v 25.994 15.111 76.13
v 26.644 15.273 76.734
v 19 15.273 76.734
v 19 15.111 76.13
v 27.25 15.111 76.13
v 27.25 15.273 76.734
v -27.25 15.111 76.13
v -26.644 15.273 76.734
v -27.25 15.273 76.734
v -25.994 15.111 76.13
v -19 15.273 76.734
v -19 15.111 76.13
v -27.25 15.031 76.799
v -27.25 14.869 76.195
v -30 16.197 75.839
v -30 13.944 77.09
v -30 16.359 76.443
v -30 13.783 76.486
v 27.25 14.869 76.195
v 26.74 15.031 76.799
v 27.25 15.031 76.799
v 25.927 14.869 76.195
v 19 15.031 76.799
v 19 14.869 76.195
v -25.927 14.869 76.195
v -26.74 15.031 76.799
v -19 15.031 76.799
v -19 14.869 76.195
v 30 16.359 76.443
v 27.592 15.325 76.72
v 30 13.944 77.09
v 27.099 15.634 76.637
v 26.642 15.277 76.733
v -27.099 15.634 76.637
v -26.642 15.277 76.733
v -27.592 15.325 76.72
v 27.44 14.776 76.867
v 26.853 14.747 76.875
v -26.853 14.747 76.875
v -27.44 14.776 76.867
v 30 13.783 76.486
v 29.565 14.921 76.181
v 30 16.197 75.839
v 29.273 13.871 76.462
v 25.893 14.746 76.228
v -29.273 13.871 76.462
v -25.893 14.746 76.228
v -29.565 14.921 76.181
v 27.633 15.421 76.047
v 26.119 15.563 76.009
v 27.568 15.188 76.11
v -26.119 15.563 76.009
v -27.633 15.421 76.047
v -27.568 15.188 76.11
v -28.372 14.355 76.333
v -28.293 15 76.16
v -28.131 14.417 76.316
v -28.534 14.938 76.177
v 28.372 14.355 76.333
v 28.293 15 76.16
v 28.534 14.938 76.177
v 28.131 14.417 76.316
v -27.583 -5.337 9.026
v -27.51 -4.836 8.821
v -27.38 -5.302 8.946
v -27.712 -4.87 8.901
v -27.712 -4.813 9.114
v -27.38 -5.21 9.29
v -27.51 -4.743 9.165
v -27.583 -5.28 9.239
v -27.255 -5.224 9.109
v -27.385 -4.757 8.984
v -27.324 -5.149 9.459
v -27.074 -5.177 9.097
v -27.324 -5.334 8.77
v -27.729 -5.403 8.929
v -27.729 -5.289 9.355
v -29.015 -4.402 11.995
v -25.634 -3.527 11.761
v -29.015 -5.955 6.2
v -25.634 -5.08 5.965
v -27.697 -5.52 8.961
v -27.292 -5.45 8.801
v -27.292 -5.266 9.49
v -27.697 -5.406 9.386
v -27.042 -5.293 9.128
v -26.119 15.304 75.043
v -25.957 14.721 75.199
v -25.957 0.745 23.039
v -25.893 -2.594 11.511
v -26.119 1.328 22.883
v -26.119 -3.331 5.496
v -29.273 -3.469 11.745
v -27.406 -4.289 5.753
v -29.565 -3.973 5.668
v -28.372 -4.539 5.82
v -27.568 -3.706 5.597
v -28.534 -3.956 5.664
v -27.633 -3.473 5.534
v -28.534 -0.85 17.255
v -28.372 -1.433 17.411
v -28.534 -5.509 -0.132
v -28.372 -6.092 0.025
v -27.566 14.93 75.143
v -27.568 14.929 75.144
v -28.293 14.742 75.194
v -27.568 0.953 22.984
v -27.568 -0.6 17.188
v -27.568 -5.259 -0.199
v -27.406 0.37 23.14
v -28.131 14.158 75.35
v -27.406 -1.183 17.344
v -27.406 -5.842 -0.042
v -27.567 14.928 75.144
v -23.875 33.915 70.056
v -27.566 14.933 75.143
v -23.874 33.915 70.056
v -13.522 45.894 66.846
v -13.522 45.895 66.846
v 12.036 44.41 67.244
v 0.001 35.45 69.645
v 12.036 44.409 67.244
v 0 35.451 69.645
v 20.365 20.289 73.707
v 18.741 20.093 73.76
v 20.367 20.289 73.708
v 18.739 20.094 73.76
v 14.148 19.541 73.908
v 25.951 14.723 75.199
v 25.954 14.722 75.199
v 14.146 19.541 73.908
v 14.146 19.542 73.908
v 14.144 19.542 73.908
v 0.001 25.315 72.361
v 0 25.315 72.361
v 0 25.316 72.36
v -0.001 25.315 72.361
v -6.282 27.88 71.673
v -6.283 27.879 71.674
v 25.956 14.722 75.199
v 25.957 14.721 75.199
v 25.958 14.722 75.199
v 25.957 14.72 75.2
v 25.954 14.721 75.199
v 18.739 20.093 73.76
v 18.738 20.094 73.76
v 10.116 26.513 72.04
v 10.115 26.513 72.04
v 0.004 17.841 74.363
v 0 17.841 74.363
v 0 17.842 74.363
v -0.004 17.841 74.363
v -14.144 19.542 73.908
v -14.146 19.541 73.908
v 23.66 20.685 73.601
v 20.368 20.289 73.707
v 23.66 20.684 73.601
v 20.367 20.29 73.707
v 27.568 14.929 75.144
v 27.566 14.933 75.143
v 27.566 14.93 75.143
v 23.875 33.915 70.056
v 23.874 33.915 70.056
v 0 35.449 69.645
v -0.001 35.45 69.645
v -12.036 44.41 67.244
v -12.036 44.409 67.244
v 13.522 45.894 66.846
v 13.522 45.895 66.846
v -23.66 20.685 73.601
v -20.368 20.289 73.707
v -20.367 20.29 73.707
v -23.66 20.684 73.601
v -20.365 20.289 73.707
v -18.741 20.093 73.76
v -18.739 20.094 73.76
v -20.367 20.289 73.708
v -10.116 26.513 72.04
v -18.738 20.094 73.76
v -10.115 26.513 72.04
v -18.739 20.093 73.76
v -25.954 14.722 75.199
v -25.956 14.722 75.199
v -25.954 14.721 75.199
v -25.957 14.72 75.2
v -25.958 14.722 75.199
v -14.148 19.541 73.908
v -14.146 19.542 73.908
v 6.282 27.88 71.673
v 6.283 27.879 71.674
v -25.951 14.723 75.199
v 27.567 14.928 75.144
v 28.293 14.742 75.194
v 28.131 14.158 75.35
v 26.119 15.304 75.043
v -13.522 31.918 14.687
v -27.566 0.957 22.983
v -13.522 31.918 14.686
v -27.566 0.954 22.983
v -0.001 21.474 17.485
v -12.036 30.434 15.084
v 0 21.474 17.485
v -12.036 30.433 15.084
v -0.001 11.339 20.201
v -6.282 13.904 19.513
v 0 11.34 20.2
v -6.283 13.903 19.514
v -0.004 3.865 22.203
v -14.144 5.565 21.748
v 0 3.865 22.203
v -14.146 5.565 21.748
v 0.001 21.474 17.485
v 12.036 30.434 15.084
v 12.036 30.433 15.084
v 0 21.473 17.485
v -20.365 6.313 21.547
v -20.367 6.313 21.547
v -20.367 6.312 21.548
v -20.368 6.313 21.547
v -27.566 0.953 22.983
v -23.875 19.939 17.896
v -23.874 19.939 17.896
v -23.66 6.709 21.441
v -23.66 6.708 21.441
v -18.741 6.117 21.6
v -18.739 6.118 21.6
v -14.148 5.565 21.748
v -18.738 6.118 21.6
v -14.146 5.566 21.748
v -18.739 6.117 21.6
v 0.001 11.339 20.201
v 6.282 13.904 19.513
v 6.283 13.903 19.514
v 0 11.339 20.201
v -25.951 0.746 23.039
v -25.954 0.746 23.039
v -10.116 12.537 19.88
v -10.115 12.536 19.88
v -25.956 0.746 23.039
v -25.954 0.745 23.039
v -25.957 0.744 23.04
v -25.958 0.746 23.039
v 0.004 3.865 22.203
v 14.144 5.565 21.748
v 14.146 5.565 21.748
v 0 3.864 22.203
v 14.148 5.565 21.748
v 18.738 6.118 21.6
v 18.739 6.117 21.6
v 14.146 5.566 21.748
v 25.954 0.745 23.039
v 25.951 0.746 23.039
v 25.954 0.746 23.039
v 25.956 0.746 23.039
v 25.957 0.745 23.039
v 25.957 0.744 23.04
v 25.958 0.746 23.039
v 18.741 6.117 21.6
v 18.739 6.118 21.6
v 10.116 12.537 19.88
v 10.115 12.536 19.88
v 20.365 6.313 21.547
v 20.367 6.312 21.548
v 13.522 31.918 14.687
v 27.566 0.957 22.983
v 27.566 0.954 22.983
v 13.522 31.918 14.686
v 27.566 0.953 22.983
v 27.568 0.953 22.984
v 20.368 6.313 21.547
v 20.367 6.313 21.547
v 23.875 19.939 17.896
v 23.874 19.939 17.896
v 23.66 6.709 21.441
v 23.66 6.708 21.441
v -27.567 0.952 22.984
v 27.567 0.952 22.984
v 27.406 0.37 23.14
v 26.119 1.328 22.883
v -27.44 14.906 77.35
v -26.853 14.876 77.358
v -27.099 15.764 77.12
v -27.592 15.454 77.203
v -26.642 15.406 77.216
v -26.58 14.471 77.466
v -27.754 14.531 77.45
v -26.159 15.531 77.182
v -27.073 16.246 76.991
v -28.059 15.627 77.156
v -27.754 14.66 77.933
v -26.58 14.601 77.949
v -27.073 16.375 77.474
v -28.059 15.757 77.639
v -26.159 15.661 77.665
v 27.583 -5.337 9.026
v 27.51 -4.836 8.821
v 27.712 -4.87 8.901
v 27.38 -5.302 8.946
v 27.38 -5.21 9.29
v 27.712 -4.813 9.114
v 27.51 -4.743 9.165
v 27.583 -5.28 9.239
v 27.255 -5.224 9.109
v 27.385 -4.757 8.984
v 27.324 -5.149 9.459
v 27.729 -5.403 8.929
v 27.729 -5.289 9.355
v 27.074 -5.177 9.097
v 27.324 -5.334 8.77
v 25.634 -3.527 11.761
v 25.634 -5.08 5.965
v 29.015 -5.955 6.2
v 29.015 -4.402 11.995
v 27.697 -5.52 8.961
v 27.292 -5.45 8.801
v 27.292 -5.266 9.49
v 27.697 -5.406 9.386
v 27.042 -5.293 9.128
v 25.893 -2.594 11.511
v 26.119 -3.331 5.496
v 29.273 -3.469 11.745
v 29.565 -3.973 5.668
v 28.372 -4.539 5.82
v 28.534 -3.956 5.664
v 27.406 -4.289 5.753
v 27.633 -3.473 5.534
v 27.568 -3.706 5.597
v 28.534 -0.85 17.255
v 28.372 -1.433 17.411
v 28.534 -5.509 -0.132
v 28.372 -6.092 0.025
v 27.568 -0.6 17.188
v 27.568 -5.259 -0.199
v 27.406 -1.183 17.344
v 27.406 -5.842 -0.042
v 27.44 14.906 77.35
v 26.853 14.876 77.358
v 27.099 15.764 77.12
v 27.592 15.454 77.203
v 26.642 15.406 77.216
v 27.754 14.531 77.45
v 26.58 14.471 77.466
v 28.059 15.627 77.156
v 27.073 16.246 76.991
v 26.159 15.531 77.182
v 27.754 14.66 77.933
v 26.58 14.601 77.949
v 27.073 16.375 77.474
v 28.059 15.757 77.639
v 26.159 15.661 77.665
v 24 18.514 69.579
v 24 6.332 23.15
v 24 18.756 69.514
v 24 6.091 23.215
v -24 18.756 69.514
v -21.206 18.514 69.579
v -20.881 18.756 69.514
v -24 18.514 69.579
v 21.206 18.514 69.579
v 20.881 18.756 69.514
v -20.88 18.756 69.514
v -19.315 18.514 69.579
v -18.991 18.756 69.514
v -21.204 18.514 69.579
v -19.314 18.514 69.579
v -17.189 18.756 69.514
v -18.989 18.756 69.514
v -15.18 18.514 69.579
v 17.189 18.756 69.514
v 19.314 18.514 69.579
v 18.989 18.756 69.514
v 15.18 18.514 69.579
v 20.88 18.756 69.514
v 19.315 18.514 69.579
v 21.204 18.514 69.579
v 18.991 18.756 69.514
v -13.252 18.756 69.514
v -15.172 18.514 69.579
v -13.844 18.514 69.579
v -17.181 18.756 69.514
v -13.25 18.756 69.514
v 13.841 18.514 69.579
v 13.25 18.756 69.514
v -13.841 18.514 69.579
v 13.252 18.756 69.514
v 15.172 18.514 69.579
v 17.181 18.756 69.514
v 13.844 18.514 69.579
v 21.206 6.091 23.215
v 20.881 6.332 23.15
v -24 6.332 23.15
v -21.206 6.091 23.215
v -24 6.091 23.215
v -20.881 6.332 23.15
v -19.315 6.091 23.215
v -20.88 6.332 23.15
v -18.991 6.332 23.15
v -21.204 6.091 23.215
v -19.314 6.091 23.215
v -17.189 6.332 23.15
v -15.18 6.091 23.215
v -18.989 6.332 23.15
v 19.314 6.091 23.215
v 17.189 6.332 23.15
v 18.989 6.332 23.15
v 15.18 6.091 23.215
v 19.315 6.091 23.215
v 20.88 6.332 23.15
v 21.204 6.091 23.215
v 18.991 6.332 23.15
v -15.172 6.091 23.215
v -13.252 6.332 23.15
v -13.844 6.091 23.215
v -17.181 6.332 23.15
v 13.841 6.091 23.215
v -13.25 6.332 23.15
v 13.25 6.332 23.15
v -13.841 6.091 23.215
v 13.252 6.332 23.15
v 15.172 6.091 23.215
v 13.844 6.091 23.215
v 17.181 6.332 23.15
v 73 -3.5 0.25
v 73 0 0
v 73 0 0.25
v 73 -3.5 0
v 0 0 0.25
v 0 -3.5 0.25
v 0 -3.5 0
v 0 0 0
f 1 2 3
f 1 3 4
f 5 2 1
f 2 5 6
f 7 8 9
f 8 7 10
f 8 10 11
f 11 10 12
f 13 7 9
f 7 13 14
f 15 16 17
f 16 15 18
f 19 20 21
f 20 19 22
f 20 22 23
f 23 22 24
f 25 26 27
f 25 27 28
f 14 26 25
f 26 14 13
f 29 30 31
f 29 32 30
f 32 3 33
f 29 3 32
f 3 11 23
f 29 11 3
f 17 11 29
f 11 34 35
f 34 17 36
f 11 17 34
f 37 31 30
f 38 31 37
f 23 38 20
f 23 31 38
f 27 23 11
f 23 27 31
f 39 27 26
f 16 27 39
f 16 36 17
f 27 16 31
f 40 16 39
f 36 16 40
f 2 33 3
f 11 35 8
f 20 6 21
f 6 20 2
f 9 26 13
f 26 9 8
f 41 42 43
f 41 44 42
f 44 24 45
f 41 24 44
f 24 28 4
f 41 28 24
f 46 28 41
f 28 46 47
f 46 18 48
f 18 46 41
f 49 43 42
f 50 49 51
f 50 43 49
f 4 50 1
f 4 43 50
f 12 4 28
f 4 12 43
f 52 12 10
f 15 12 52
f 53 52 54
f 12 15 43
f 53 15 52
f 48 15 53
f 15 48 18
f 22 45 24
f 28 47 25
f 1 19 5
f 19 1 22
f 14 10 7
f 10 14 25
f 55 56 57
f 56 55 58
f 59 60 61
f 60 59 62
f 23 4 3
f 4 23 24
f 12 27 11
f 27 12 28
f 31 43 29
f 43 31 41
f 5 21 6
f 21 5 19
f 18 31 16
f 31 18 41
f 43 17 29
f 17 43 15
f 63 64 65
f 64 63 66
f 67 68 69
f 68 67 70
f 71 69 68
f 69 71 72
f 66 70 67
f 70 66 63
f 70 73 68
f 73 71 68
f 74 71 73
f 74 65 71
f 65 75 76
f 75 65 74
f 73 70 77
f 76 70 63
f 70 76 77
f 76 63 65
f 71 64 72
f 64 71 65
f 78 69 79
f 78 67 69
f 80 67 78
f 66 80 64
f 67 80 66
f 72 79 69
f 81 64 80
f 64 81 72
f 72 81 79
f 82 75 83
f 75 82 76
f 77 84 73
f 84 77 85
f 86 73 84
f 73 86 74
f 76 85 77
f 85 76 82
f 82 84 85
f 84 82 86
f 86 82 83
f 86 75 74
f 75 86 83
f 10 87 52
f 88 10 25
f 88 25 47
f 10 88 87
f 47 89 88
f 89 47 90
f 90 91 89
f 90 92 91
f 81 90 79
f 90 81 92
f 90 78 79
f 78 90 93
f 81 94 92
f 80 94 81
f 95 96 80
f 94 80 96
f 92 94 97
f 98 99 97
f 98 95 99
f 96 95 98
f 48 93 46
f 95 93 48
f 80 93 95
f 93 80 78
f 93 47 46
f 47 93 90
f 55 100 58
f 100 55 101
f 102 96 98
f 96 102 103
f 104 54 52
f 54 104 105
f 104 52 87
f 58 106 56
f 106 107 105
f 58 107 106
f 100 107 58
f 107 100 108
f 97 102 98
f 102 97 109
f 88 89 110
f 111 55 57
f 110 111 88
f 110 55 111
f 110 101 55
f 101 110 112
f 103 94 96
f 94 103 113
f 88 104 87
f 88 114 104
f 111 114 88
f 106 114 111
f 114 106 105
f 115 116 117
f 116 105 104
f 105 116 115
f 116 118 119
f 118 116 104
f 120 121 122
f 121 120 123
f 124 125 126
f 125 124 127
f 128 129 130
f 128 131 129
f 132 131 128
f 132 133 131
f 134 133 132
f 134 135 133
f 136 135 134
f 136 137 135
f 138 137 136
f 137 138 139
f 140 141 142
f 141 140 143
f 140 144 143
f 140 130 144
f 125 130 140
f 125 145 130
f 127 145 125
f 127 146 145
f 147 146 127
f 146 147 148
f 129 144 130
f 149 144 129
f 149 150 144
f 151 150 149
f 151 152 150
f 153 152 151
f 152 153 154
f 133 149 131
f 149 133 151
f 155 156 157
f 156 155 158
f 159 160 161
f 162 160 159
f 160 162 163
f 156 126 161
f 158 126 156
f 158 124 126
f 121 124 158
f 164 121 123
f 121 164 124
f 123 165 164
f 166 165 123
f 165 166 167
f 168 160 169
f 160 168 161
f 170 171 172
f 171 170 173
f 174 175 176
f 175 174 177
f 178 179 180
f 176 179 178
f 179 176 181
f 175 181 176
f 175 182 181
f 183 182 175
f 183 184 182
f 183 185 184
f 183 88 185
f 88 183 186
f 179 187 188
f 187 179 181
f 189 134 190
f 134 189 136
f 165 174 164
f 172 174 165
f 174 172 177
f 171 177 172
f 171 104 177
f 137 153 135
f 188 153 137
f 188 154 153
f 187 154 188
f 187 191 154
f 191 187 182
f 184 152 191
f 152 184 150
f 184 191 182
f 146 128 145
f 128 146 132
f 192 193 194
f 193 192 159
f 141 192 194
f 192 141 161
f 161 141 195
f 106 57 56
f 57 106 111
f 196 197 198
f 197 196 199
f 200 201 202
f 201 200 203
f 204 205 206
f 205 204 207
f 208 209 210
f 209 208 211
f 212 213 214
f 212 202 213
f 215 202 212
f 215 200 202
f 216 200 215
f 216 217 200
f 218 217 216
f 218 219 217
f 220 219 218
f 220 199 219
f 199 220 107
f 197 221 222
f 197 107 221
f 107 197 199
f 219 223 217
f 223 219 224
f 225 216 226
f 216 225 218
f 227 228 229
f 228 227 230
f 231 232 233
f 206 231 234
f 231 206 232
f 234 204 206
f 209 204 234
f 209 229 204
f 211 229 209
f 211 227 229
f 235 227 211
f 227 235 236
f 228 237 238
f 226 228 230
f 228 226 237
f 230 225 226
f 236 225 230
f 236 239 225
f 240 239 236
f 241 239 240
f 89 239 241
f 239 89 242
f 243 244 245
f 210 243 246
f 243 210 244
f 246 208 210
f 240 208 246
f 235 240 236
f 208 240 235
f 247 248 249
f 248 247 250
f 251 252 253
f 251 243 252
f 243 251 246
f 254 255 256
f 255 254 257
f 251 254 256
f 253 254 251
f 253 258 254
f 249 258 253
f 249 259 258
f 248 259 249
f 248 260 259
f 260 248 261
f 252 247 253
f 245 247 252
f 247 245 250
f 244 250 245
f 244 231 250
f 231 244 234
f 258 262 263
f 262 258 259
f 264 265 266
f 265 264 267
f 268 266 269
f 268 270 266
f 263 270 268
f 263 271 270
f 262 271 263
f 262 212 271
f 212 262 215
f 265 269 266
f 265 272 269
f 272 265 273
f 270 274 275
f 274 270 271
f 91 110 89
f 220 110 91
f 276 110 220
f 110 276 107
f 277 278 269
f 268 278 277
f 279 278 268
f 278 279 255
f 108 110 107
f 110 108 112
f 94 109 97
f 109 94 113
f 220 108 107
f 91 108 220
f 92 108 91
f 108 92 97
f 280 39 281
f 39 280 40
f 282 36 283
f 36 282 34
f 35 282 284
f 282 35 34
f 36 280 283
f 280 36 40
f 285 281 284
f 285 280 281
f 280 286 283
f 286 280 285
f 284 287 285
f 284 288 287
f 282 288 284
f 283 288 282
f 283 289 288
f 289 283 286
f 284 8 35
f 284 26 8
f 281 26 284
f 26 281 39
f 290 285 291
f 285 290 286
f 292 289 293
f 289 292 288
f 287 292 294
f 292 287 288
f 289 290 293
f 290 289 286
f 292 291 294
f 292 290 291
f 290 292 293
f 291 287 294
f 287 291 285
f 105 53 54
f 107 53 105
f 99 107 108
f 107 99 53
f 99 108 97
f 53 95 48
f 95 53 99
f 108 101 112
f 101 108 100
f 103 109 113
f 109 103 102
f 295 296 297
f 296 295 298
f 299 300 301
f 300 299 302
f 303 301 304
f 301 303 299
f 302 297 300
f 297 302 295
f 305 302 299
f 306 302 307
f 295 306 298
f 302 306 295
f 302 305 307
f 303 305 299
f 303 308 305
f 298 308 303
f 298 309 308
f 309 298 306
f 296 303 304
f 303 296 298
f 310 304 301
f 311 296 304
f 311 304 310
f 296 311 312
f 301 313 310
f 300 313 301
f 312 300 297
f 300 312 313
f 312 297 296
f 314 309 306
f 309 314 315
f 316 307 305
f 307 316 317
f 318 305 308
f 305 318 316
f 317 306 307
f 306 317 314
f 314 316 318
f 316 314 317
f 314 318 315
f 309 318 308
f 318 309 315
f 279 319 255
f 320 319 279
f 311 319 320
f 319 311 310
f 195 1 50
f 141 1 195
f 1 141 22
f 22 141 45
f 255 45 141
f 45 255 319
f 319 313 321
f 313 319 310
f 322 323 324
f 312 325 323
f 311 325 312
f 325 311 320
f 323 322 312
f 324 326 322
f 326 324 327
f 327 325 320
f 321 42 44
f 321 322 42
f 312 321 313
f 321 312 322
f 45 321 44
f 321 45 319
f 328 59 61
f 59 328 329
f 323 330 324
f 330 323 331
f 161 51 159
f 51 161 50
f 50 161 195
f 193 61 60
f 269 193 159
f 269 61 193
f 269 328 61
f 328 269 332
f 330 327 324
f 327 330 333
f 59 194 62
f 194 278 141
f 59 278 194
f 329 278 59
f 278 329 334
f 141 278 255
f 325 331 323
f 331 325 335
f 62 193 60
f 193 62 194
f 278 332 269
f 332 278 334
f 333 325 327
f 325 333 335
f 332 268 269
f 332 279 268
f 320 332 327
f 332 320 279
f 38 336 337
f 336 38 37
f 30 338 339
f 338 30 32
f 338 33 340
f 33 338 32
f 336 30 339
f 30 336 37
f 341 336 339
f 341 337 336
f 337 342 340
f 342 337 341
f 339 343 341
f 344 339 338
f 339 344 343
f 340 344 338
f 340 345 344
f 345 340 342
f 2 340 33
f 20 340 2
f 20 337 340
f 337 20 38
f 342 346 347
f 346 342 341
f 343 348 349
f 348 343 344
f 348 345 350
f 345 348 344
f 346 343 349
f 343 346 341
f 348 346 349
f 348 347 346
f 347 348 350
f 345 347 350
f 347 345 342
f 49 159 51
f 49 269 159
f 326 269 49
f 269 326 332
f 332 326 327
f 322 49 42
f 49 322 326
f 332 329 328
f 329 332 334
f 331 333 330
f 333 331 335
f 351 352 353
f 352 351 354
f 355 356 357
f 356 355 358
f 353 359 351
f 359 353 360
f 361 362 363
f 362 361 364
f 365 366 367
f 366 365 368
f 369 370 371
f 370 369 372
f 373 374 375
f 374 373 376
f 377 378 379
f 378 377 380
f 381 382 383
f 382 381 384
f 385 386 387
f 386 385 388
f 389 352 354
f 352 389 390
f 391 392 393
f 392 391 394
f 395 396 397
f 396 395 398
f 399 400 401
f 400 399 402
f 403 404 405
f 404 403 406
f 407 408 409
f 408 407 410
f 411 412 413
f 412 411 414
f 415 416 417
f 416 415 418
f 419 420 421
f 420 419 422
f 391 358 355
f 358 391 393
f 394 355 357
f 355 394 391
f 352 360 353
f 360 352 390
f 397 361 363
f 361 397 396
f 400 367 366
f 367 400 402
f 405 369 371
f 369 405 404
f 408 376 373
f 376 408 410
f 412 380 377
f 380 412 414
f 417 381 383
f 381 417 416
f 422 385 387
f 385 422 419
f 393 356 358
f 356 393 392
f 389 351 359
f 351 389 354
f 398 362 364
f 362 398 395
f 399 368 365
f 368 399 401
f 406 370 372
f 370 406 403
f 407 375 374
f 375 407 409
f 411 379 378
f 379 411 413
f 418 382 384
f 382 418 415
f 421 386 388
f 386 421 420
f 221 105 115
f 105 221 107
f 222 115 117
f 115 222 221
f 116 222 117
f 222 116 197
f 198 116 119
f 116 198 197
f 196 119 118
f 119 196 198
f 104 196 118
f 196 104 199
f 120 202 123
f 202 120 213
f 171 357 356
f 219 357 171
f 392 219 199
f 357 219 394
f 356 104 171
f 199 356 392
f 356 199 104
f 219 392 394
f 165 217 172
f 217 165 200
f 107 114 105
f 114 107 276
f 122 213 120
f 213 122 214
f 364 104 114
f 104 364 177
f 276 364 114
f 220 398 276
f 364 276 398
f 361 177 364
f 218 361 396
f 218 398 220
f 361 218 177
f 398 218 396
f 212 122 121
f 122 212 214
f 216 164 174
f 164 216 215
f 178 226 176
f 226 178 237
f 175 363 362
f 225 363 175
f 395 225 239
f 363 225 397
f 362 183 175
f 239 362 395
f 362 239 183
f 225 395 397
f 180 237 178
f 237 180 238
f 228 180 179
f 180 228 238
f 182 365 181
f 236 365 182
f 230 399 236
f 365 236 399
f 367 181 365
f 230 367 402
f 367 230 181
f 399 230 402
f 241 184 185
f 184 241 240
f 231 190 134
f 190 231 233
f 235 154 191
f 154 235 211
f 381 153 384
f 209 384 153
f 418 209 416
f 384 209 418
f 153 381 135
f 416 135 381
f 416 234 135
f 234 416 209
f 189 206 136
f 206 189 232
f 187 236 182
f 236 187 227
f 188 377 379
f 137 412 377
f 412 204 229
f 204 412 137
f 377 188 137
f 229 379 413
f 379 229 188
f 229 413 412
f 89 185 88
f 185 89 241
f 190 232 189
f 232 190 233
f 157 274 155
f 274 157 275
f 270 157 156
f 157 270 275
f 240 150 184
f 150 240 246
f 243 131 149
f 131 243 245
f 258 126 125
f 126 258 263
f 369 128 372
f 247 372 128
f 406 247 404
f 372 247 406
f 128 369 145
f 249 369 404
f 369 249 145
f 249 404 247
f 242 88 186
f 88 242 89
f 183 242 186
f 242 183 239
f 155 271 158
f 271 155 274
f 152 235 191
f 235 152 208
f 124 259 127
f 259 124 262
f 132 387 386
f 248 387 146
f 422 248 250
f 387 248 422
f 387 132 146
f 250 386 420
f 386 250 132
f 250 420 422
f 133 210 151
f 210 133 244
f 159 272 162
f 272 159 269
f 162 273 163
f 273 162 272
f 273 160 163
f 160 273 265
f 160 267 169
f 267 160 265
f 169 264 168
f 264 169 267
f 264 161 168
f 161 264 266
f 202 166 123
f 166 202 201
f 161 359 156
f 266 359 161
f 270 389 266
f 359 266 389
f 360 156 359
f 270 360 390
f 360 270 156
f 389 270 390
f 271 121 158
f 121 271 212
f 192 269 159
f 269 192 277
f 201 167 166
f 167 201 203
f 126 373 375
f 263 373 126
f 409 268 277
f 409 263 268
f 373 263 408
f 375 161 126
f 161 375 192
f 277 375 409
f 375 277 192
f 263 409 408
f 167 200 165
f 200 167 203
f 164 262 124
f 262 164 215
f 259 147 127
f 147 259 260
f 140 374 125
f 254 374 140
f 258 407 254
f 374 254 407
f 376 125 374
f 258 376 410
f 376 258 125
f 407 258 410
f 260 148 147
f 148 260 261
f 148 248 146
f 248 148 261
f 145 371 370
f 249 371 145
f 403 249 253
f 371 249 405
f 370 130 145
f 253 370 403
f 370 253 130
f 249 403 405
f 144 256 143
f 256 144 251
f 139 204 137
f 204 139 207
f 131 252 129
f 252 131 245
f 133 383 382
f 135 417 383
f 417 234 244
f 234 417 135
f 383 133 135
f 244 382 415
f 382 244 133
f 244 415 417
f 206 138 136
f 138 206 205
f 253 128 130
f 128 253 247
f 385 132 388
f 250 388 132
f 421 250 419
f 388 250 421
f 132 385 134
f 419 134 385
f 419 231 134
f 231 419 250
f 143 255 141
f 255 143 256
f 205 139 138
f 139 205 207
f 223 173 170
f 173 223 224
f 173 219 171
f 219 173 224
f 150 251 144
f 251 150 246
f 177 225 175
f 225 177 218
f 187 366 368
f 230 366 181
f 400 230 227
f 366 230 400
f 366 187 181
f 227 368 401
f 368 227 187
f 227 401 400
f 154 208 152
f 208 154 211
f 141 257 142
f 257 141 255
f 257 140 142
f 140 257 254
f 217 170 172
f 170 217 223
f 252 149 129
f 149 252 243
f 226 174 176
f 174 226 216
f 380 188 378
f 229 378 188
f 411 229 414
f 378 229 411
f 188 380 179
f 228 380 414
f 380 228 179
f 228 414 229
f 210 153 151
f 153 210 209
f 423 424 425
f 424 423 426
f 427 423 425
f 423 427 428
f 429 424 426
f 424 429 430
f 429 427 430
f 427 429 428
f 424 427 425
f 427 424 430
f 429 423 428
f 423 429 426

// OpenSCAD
// units in inches

// [width, depth, length]

/* [General] */

display_model            = true;
display_cut_list         = true;

height                   =  6;      // [  0.0   : 0.25   : 24.0]
distance                 =  6;      // [  0.0   : 0.25   : 24.0]
spread                   = 52;      // [  6.0   : 0.25   : 72.0]
toe_out                  = 15;      // [-15     : 1      : 45  ]

/* [Beam Visualization] */

display_main_beam        = true;
main_beam_throw          = 50;      // [  0     : 1      : 72  ]
main_beam_alpha          = 0.2;     // [  0.0   : 0.025  :  1.0]
display_front_reflection = true;
front_reflection_throw   = 35;      // [  0     : 1      : 72  ]
front_reflection_alpha   = 0.1;     // [  0.0   : 0.025  :  1.0]
display_back_reflection  = true;
back_reflection_throw    = 20;      // [  0     : 1      : 72  ]
back_reflection_alpha    = 0.05;    // [  0.0   : 0.025  :  1.0]

/* [Light Strip] */

strip_length             = 54;      // [ 12.0   : 0.25   : 96.0]
strip_width              =  0.625;  // [  0.25  : 0.0625 :  1.0]
strip_depth              =  0.25;   // [  0.0   : 0.0625 :  0.5]

front_shade_width        =  2.25;   // [  0.0   : 0.125  :  6.0]
back_shade_width         =  0.75;   // [  0.0   : 0.125  :  6.0]

base_width               =  1;      // [  0.5   : 0.125  :  2.0]
base_depth               = strip_width;
front_depth              =  0.25;   // [  0.125 : 0.0625 :  1.0]
back_depth               =  0.25;   // [  0.125 : 0.0625 :  1.0]

front_overhang           = front_shade_width + strip_depth;
back_overhang            = back_shade_width + strip_depth;
post_width               = base_width + front_overhang;

/* [Spanner] */

min_spread               = 36;      // [  6.0   : 0.25   : 72.0]
max_spread               = 52;      // [  6.0   : 0.25   : 72.0]

spanner_width            =  2.5;    // [  1.0   : 0.25   :  6.0]
spanner_depth            =  0.625;  // [  0.25  : 0.0625 :  2.0]
spanner_overhang         =  0.5;    // [  0.0   : 0.25   :  6.0]
spanner_slot_width       =  0.25;   // [  0.125 : 0.0625 :  0.5]

wire_clearance           =  0.25;   // [  0.0   : 0.0625 :  1.0]
top_block_length         =  1;      // [  0.0   : 0.125  :  6.0]
top_block_width          = front_overhang - wire_clearance;

/* [Legs] */

leg_adjustment           = 12;      // [  0.0   : 0.25   : 48.0]
leg_width                =  1;      // [  0.5   : 0.125  :  6.0]
leg_overlap              =  6;      // [  0.0   : 0.25   : 12.0]
leg_length               = leg_adjustment + leg_overlap;

latch_block_depth        =  1;      // [  0.0   : 0.0625 :  2.0]

/* [Colors] */

wood      = [0.55, 0.45, 0.35 ];
dark_wood = [0.35, 0.25, 0.15 ];
silver    = [0.5,  0.5,  0.525];
black     = [0.1,  0.1,  0.1  ];


post_length = strip_length + top_block_length + leg_length;

rotX = post_width - top_block_width/2;
rotY = front_depth + base_depth/2;


front_shade_panel = [base_width + front_overhang, front_depth, post_length];
base_panel        = [base_width,                  base_depth,  post_length];
back_shade_panel  = [base_width + back_overhang,  back_depth,  post_length];

leg_panel       = [                 leg_width, base_depth, leg_length];
leg_guide_panel = [front_overhang - leg_width, base_depth, leg_length];

latch_block_panel = [post_width, latch_block_depth, leg_overlap];
top_block_panel   = [top_block_width, base_depth, top_block_length];


spanner_length      = max_spread + 2*post_width + 2*spanner_overhang;
spanner_end_length  = rotX + spanner_overhang - spanner_slot_width/2;
spanner_slot_length = (max_spread-min_spread)/2 + spanner_slot_width;
spanner_mid_length  = spanner_length - 2*spanner_slot_length - 2*spanner_end_length;
spanner_side_width  = (spanner_width-spanner_slot_width)/2;

spanner_side_panel = [spanner_side_width, spanner_depth, spanner_length];
spanner_end_panel  = [spanner_slot_width, spanner_depth, spanner_end_length];
spanner_mid_panel  = [spanner_slot_width, spanner_depth, spanner_mid_length];


// all after translating by [base_width + strip_depth, front_depth]:

function unit(v) = v / norm(v);

ledXY = [0, base_depth/2];

shadeFXY = [front_shade_width, 0];
shadeBXY = [back_shade_width,  base_depth];

main_beam_back   = unit(shadeBXY - ledXY);
main_beam_front  = unit(shadeFXY - ledXY);

back_beam_back   = unit(shadeBXY - [3/5*back_shade_width, 0]);
back_beam_front  = unit([min(back_shade_width, 1/3*front_shade_width), base_depth] - ledXY);

front_beam_back  = unit(shadeBXY - [1/3*back_shade_width, 0]);
// front_beam_front = unit([front_shade_width, base_depth] - ledXY);
front_beam_front = [main_beam_front[0], -main_beam_front[1]];


function tail(v) = let (l = len(v))
  l >= 2 ? [ for (i = [1 : len(v)-1]) v[i] ] :
  l == 1 ? [] :
  undef;

if (display_cut_list) cut_list([
  [2, front_shade_panel],
  [2, base_panel],
  [2, back_shade_panel],
  [2, leg_panel],
  [2, leg_guide_panel],
  [2, latch_block_panel],
  [2, top_block_panel],
  [2, spanner_side_panel],
  [2, spanner_end_panel],
  [1, spanner_mid_panel],
]);

module cut_list(v) {
  if (len(v) > 0) {
    count = v[0][0];
    panel = v[0][1];
    translate([0, -panel[0], 0]) {
      color(wood, 1.0) cube([panel[2], panel[0], panel[1]]);
      translate([0, -1.5, 0]) {
        scale(.125) text(str(count, "x  ", panel[2], " x ", panel[0], " x ", panel[1]));
        translate([0, -1, 0]) cut_list(tail(v));
      }
    }
  }
}


module flip(v=[1, 0, 0], copy=true) {
  if (copy) children();
  mirror(v) children();
}

module rotateAbout(tv=[0, 0, 0], a=0, rv=[0, 0, 1]) {
  translate(tv) rotate(a, rv) translate([for (i=tv) -i]) children();
}


module knob(handle_height, shaft_height, handle_radius, shaft_radius) {
  cylinder(h=shaft_height, r=shaft_radius);
  translate([0, 0, shaft_height])
    cylinder(h=handle_height, r=handle_radius);
}

module spanner() {
  cube(spanner_side_panel);
  translate([spanner_side_width, 0, 0]) {
    cube(spanner_end_panel);
    translate([0, 0, spanner_end_length + spanner_slot_length])
      cube(spanner_mid_panel);
    translate([0, 0, spanner_length - spanner_end_length])
      cube(spanner_end_panel);
  }
  translate([spanner_side_width + spanner_slot_width, 0, 0])
    cube(spanner_side_panel);
}

if (display_model) {
  // spanner
  translate([0, -distance, 0])
    rotate([-15, 0, 0])
      translate([0, front_depth + base_depth/2, post_length + height])
        color(wood, 1.0)
          rotate([90,0,90])
            translate([-spanner_width/2, 0, -spanner_length/2])
              spanner();

  flip() translate([-spread/2 - post_width, -distance, 0]) rotate([-15, 0, 0]) {
    rotateAbout([rotX, rotY, 0], toe_out) {
      // leg
      translate([base_width, front_depth, 0])
        color(wood, 1.0)
          cube(leg_panel);

      // post
      translate([0, 0, height]) {
        translate([0, -latch_block_depth, 0]) {
          // latch block layer
          color(wood, 1.0)
            cube(latch_block_panel);
          color(silver, 1.0)
            translate([base_width + leg_width/2, 0, leg_overlap/2])
              rotate([90, 0, 0])
                knob(0.125, 0.5, 0.375, 0.1875);
        }
        {
          // front layer
          color(wood, 1.0) cube(front_shade_panel);
        }
        translate([0, front_depth, 0]) {
          // base layer
          color(wood, 1.0) {
            cube(base_panel);
            translate([base_width + wire_clearance, 0, post_length - top_block_length])
              cube(top_block_panel);
            translate([base_width + leg_width, 0, 0])
              cube(leg_guide_panel);
          }
        }
        translate([rotX, rotY, post_length + spanner_depth])
          color(black, 1.0)
            knob(0.5, 0.5, 1, 0.5);
        translate([0, front_depth + base_depth, 0]) {
          // back layer
          color(wood, 1.0)
            cube(back_shade_panel);
        }
      }
    }
  }

  // panel
  rotate([-15, 0, 0]) {
    translate([0, 0, 48])
      color(dark_wood, 0.25) cube([48, .25, 48], center=true);
  }
}

function r90(v) = [v[1], -v[0]];
function l90(v) = [-v[1], v[0]];

module line(start, direction, length, thickness) {
  polygon(points=[
    start,
    start + thickness,
    start + length*direction + thickness,
    start + length*direction,
  ]);
}

module panel(start, direction, length, height, thickness) {
  linear_extrude(height=height, slices=0) {
    line(start, direction, length, thickness);
  }
}

flip() translate([-spread/2 - post_width, -distance, 0]) rotate([-15, 0, 0]) {
  rotateAbout([rotX, rotY, 0], toe_out) {
    translate([base_width + strip_depth, front_depth, height + leg_length]) {
      if (display_back_reflection)
        color([1, 1, 1, back_reflection_alpha])
          panel(shadeBXY, back_beam_back, back_reflection_throw, strip_length, .001*r90(back_beam_back));
      if (display_front_reflection)
        color([1, 1, 1, front_reflection_alpha])
          panel(shadeBXY, front_beam_back, front_reflection_throw, strip_length, .001*r90(front_beam_back));
      if (display_main_beam)
        color([1, 1, 1, main_beam_alpha])
          panel(shadeBXY, main_beam_back, main_beam_throw, strip_length, .001*r90(main_beam_back));

      if (display_back_reflection)
        color([1, 1, 1, back_reflection_alpha])
          panel([min(3*back_shade_width, front_shade_width), 0], back_beam_front, back_reflection_throw, strip_length, .001*r90(back_beam_front));
      if (display_front_reflection)
        color([1, 1, 1, front_reflection_alpha])
          panel(shadeFXY, front_beam_front, front_reflection_throw, strip_length, .001*r90(front_beam_front));

      if (display_main_beam)
        color([1, 1, 1, main_beam_alpha])
          panel(shadeFXY, main_beam_front, main_beam_throw, strip_length, .001*l90(main_beam_front));
    }
  }
}
